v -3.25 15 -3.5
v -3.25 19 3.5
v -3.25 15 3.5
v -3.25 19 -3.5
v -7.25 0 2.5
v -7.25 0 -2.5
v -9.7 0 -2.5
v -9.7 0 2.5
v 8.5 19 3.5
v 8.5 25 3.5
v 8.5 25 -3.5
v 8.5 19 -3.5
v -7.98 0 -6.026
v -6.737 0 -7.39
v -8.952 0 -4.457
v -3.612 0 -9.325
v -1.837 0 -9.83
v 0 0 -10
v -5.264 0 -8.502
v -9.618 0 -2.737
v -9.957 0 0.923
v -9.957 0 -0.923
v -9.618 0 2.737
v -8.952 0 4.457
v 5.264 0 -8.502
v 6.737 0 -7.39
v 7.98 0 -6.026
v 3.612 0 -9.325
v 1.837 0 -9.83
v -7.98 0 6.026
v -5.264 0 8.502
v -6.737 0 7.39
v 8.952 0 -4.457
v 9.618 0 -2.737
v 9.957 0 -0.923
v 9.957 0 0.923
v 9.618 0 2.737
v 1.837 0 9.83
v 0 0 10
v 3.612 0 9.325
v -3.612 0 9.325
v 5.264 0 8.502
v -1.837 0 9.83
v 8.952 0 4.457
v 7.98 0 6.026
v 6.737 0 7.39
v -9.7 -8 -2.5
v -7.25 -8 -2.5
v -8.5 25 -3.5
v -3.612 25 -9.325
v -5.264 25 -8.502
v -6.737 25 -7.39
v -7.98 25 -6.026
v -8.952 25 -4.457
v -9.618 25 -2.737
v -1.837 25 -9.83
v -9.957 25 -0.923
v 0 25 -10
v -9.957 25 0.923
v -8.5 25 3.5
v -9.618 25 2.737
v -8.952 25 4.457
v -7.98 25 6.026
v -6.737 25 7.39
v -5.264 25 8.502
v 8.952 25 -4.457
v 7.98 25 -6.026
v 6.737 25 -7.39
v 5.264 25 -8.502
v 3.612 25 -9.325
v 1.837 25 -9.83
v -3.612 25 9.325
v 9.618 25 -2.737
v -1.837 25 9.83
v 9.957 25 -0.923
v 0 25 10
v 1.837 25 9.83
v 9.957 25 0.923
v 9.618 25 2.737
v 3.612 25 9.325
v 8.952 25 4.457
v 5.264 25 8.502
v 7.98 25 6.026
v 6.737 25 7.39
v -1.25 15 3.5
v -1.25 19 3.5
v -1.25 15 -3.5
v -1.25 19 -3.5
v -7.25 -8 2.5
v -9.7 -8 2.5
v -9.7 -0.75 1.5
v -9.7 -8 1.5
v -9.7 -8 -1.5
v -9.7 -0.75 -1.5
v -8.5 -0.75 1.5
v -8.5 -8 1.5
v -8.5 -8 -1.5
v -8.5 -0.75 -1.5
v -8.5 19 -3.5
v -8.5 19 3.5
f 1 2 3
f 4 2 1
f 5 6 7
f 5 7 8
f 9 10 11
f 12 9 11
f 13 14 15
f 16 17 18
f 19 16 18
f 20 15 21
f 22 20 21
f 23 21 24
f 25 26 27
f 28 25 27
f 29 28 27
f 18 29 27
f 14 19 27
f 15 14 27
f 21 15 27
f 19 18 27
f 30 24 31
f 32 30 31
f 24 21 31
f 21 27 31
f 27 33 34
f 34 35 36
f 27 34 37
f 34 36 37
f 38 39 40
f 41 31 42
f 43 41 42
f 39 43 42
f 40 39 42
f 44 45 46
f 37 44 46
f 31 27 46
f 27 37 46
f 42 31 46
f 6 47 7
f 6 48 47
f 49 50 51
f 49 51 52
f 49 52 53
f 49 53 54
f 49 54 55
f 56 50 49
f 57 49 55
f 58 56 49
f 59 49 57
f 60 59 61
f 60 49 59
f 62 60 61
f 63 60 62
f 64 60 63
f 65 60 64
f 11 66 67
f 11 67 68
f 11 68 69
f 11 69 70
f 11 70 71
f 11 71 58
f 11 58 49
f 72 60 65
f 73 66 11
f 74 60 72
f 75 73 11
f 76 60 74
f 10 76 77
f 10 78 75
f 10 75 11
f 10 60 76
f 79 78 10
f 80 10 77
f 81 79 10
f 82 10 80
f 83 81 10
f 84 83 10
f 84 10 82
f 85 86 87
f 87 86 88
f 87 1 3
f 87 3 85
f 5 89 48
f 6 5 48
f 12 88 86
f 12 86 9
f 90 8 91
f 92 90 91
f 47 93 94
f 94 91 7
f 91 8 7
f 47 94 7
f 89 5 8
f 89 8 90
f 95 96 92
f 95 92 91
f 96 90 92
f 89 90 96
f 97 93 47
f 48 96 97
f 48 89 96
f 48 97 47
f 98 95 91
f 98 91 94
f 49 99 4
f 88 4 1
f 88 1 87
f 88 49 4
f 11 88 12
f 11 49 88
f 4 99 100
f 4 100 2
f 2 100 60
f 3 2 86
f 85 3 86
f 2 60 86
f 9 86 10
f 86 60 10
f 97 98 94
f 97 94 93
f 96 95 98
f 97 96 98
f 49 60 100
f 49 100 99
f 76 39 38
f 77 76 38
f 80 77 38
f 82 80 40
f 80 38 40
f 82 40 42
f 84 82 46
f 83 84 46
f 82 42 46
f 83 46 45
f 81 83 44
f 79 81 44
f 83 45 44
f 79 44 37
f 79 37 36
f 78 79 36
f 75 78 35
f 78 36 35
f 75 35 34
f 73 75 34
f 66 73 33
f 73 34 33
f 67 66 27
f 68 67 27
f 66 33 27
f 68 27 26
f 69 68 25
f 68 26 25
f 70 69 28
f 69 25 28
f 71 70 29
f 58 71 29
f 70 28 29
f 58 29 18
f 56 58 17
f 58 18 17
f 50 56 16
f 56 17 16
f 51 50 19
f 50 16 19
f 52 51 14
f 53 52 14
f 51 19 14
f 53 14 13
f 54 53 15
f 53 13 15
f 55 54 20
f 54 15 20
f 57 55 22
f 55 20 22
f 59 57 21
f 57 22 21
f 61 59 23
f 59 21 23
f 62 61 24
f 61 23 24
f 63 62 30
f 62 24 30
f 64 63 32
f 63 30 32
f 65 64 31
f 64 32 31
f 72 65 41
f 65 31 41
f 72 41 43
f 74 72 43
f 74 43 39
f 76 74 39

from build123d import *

# Parameters (mm, degrees)
SKETCH1_R           = 10
BOSS_EXTRUDE1_DEPTH = 25
SKETCH2_W           = 1.25
SKETCH2_H           = 5
BOSS_EXTRUDE2_DEPTH = 8
BOSS_EXTRUDE3_DEPTH = 1.2
SKETCH4_W           = 17
SKETCH4_H           = 7
CUT_EXTRUDE1_DEPTH  = 6
SKETCH5_W           = 2
SKETCH5_H           = 7
CUT_EXTRUDE2_DEPTH  = 4


with BuildPart() as part:
    # Sketch1 → Boss-Extrude1 (new body)
    with BuildSketch(Plane(origin=(0, 0, 0), x_dir=(1, 0, 0), z_dir=(0, 1, 0))):
        with Locations(Location((0, 0, 0), (0, 0, 270))):
            Circle(SKETCH1_R)
    extrude(amount=BOSS_EXTRUDE1_DEPTH)

    # Sketch4 → Cut-Extrude1 (cut)
    with BuildSketch(Plane(origin=(0, 25, 0), x_dir=(1, 0, 0), z_dir=(0, 1, 0))):
        Rectangle(SKETCH4_W, SKETCH4_H)
    extrude(amount=-CUT_EXTRUDE1_DEPTH, mode=Mode.SUBTRACT)

    # Sketch5 → Cut-Extrude2 (cut)
    with BuildSketch(Plane(origin=(0, 19, 0), x_dir=(1, 0, 0), z_dir=(0, 1, 0))):
        with Locations((-2.25, 0)):
            Rectangle(SKETCH5_W, SKETCH5_H)
    extrude(amount=-CUT_EXTRUDE2_DEPTH, mode=Mode.SUBTRACT)


with BuildPart() as body_2:
    # Sketch2 → Boss-Extrude2 (new body)
    with BuildSketch(Plane(origin=(0, 0, 0), x_dir=(-1, 0, 0), z_dir=(0, -1, 0))):
        with Locations((7.875, 0)):
            Rectangle(SKETCH2_W, SKETCH2_H)
    extrude(amount=BOSS_EXTRUDE2_DEPTH)

    # Sketch3 → Boss-Extrude3 (add)
    with BuildSketch(Plane.ZY.offset(8.5)):
        Polygon((-2.5, -8), (-2.5, 0), (2.5, 0), (2.5, -8), (1.5, -8), (1.5, -0.75), (-1.5, -0.75), (-1.5, -8), align=None)
    extrude(amount=BOSS_EXTRUDE3_DEPTH)


solid = Compound([part.part, body_2.part])
